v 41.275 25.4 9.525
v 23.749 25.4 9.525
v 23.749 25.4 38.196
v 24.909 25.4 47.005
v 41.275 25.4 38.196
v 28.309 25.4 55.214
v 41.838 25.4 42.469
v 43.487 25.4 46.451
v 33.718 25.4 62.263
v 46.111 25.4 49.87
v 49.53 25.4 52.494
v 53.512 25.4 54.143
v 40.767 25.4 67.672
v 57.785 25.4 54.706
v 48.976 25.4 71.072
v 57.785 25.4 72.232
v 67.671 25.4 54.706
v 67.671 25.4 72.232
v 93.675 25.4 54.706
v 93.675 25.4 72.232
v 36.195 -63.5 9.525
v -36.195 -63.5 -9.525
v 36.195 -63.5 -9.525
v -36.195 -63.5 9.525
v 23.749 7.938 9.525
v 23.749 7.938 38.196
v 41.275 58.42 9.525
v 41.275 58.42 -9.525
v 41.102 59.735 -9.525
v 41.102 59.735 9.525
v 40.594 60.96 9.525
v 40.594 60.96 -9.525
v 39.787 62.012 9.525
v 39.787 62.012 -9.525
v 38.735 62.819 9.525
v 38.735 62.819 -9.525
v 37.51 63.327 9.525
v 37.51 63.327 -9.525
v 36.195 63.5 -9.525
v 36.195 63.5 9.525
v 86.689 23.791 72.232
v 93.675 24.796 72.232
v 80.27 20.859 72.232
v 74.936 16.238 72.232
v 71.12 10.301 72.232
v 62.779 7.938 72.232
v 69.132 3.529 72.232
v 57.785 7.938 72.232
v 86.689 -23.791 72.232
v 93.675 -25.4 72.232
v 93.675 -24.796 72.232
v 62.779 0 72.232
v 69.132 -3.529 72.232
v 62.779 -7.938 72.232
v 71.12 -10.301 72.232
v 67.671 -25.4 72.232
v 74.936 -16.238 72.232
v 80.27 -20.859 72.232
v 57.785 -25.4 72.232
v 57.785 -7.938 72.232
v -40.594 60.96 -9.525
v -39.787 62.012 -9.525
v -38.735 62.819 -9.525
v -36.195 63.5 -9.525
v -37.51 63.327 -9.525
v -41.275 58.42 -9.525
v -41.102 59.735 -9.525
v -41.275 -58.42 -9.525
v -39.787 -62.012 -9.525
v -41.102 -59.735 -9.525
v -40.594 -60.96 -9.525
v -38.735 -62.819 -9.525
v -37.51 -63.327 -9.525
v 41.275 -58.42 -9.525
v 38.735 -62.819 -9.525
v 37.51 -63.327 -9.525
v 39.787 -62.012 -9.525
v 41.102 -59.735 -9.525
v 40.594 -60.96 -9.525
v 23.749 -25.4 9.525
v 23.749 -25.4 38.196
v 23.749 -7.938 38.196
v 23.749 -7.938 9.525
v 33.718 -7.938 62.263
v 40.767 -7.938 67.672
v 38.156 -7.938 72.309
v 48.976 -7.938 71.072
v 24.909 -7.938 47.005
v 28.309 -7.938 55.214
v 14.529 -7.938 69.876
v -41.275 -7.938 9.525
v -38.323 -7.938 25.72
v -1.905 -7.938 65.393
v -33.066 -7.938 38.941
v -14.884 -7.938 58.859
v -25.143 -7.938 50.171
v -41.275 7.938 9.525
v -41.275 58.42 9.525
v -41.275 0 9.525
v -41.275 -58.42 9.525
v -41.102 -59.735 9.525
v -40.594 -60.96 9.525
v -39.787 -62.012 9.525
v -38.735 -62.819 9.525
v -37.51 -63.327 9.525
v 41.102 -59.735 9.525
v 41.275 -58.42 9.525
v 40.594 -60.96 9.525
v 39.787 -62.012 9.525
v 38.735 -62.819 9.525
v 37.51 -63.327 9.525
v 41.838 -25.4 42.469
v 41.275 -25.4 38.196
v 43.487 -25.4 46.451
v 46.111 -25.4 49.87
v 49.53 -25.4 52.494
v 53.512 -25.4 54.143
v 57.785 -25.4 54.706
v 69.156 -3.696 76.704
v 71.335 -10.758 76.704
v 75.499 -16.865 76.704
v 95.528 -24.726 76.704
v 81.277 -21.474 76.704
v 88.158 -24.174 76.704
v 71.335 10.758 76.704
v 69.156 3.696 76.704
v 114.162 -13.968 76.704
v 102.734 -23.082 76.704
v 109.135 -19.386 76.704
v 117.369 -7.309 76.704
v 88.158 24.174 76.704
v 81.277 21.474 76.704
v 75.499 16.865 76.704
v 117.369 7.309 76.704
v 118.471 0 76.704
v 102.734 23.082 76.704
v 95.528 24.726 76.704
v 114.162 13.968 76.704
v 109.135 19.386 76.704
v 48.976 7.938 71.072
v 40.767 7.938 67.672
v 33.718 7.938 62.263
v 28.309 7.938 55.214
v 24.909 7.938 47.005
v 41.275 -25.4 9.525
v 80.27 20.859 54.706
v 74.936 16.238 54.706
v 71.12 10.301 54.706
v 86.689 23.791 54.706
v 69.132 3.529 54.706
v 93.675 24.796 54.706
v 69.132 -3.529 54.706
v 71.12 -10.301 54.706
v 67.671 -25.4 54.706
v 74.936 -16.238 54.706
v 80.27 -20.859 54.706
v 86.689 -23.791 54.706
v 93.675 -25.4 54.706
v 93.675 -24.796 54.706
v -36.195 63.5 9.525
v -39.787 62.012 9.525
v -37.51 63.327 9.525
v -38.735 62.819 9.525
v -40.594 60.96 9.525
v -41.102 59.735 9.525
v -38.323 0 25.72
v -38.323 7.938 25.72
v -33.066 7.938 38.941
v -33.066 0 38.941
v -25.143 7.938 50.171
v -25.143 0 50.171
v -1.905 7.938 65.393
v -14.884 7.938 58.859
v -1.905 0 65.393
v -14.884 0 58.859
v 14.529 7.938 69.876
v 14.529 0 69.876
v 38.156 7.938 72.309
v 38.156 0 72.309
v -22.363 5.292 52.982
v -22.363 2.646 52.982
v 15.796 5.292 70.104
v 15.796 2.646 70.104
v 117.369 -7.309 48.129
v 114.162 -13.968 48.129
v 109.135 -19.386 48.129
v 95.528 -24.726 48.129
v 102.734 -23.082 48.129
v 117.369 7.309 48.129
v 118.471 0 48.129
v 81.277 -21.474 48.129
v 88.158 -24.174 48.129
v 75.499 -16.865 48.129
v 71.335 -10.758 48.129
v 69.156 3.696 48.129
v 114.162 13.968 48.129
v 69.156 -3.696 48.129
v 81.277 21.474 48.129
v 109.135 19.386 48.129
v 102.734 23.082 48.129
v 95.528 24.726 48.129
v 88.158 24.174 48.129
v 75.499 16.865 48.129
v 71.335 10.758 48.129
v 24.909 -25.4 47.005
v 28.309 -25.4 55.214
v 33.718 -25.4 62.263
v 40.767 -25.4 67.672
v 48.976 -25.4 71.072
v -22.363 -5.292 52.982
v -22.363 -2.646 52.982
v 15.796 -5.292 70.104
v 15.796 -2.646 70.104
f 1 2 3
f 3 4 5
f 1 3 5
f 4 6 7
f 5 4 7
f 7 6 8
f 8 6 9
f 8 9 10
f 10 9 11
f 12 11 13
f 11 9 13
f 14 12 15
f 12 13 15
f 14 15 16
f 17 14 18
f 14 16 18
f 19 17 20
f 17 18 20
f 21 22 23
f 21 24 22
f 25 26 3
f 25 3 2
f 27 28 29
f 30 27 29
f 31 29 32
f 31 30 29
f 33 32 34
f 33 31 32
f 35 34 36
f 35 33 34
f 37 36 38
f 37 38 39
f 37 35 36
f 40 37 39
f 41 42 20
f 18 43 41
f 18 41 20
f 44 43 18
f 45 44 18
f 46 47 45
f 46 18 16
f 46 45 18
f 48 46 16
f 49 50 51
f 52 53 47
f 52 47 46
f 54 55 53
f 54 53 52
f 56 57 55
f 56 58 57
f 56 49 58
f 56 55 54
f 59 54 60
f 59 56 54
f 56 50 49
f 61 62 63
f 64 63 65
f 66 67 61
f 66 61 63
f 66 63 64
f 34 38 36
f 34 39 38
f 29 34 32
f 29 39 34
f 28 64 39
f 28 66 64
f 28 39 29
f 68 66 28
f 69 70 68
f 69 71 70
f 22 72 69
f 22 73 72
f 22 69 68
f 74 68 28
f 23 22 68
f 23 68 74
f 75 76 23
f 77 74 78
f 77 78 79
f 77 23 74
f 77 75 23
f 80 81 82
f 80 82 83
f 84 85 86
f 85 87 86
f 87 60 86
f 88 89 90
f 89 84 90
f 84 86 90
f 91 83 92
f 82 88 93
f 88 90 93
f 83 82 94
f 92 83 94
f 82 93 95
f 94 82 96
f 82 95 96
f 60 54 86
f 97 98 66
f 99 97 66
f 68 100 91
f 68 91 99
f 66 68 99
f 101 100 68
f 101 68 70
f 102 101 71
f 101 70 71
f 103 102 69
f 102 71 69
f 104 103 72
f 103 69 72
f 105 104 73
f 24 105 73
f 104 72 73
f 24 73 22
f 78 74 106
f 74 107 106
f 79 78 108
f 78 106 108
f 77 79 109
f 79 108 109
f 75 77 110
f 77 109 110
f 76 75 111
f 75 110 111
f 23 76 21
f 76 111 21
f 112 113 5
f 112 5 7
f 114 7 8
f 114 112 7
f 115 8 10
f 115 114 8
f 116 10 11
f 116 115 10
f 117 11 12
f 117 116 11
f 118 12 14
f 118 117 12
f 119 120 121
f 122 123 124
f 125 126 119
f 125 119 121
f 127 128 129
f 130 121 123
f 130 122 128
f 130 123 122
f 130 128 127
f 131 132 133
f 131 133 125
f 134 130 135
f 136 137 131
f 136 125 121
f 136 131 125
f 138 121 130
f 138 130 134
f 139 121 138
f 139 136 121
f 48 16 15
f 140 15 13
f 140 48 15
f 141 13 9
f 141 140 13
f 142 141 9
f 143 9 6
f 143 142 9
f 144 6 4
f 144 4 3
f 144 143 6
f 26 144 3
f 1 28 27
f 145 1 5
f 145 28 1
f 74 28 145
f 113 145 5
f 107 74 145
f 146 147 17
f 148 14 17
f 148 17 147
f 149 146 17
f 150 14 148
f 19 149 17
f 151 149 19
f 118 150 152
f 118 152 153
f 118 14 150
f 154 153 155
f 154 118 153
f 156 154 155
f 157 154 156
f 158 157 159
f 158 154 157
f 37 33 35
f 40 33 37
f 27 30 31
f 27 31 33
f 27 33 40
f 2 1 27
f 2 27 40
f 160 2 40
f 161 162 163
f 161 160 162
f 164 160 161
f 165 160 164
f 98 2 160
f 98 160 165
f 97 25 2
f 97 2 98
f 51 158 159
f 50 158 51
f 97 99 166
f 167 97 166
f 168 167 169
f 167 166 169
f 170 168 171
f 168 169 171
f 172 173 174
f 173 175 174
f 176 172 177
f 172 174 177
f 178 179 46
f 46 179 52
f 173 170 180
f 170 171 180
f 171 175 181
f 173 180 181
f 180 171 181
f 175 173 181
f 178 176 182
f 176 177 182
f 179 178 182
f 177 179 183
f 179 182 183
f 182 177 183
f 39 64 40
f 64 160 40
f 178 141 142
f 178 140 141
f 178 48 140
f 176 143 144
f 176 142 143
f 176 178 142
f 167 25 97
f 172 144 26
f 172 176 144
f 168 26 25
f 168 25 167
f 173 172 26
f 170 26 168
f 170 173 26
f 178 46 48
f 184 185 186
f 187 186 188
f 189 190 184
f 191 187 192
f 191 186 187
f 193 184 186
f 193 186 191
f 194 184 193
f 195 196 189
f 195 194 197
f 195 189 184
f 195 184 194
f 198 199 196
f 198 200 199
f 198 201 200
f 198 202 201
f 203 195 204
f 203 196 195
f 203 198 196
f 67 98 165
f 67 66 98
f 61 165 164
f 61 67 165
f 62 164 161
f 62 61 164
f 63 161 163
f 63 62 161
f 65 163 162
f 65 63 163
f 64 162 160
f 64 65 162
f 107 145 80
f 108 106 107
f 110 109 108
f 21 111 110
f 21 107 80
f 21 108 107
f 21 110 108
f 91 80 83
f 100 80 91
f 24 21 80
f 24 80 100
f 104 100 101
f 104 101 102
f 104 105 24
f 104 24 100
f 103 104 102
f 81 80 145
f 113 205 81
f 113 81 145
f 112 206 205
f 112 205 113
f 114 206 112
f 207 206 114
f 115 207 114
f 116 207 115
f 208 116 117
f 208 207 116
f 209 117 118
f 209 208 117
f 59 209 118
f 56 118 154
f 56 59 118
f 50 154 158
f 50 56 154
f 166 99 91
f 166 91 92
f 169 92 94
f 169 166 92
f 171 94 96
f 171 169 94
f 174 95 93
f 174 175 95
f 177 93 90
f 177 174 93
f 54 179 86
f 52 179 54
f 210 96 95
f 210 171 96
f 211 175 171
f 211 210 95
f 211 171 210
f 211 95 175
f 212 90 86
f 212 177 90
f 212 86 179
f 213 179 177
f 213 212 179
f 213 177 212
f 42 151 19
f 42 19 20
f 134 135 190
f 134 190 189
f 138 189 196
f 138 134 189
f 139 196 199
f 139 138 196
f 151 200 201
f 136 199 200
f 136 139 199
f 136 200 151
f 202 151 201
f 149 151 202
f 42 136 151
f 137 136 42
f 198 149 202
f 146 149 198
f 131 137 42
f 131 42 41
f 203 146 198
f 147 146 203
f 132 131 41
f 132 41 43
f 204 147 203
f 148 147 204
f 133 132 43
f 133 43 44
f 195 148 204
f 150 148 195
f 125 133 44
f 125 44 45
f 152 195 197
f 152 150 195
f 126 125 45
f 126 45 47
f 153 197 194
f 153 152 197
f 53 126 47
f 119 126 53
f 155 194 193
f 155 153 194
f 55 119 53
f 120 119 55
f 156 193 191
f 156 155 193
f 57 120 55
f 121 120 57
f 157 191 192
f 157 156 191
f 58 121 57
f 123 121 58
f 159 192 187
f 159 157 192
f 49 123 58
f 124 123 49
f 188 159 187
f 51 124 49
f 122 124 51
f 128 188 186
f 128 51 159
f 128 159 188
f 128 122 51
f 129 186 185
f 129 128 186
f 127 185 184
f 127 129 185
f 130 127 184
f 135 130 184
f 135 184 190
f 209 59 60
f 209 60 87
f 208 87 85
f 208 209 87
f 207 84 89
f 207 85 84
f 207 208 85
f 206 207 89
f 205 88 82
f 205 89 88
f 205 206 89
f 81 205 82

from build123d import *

# Parameters (mm, degrees)
F1_DEPTH = 63.5
F0_W     = 26.0042664987
F0_H     = 17.5260005385
F2_DEPTH = 25.4
F3_DEPTH = 7.9375
F5_R     = 5.08


with BuildPart() as f1:
    # F0 (on Front) → F1 (new body, symmetric)
    with BuildSketch(Plane.XZ):
        Polygon((23.7489994615, 9.525), (-41.275, 9.525), (-41.275, -9.525), (41.275, -9.525), (41.275, 9.525), align=None)
    extrude(amount=F1_DEPTH, both=True)

    # F0 (on Front) → F2 (join, symmetric)
    with BuildSketch(Plane.XZ):
        with BuildLine():
            Line((23.7489994615, 38.1957218051), (23.7489994615, 9.525))
            Line((23.7489994615, 9.525), (41.275, 9.525))
            Line((41.275, 9.525), (41.275, 38.1957218051))
            ThreePointArc((41.275, 38.1957218051), (46.1106670426, 49.8700547625), (57.785, 54.7057218051))
            Line((57.785, 54.7057218051), (67.6709335013, 54.7057218051))
            Line((67.6709335013, 54.7057218051), (67.6709335013, 72.2317223436))
            Line((67.6709335013, 72.2317223436), (62.7786442637, 72.2317223436))
            Line((62.7786442637, 72.2317223436), (57.785, 72.2317223436))
            ThreePointArc((57.785, 72.2317223436), (33.7179132148, 62.2628085903), (23.7489994615, 38.1957218051))
        make_face()
        with Locations((80.6730667507, 63.4687220743)):
            Rectangle(F0_W, F0_H)
    extrude(amount=F2_DEPTH, both=True)

    # F0 (on Front) → F3 (join, symmetric)
    with BuildSketch(Plane.XZ):
        with BuildLine():
            add(Edge.make_bspline(
                [(-41.275, 9.525), (-35.4608595371, 69.9300542474), (14.8590393364, 73.8207250834), (62.7786442637, 72.2317223436)],
                knots=[0, 0, 0, 0, 121.4878344183, 121.4878344183, 121.4878344183, 121.4878344183], degree=3))
            Line((-41.275, 9.525), (23.7489994615, 9.525))
            Line((23.7489994615, 9.525), (23.7489994615, 38.1957218051))
            ThreePointArc((23.7489994615, 38.1957218051), (33.7179132148, 62.2628085903), (57.785, 72.2317223436))
            Line((57.785, 72.2317223436), (62.7786442637, 72.2317223436))
        make_face()
    extrude(amount=F3_DEPTH, both=True)

    # F0 (on Front) → F4 (revolve)
    with BuildSketch(Plane.XZ):
        Polygon((93.6752, 76.7040487946), (93.6752, 72.2317223436), (93.6752, 54.7057218051), (93.6752, 48.1290487946), (118.4709335013, 48.1290487946), (118.4709335013, 76.7040487946), align=None)
    revolve(axis=Axis((93.6752, 0, 62.4165487946), (0, 0, 1)))

    # F5
    f5_edges = [f1.edges().sort_by_distance(p)[0] for p in [
        (41.275, 63.5, 0),
        (-41.275, 63.5, 0),
        (-41.275, -63.5, 0),
        (41.275, -63.5, 0),
    ]]
    fillet(f5_edges, radius=F5_R)


solid = f1.part
